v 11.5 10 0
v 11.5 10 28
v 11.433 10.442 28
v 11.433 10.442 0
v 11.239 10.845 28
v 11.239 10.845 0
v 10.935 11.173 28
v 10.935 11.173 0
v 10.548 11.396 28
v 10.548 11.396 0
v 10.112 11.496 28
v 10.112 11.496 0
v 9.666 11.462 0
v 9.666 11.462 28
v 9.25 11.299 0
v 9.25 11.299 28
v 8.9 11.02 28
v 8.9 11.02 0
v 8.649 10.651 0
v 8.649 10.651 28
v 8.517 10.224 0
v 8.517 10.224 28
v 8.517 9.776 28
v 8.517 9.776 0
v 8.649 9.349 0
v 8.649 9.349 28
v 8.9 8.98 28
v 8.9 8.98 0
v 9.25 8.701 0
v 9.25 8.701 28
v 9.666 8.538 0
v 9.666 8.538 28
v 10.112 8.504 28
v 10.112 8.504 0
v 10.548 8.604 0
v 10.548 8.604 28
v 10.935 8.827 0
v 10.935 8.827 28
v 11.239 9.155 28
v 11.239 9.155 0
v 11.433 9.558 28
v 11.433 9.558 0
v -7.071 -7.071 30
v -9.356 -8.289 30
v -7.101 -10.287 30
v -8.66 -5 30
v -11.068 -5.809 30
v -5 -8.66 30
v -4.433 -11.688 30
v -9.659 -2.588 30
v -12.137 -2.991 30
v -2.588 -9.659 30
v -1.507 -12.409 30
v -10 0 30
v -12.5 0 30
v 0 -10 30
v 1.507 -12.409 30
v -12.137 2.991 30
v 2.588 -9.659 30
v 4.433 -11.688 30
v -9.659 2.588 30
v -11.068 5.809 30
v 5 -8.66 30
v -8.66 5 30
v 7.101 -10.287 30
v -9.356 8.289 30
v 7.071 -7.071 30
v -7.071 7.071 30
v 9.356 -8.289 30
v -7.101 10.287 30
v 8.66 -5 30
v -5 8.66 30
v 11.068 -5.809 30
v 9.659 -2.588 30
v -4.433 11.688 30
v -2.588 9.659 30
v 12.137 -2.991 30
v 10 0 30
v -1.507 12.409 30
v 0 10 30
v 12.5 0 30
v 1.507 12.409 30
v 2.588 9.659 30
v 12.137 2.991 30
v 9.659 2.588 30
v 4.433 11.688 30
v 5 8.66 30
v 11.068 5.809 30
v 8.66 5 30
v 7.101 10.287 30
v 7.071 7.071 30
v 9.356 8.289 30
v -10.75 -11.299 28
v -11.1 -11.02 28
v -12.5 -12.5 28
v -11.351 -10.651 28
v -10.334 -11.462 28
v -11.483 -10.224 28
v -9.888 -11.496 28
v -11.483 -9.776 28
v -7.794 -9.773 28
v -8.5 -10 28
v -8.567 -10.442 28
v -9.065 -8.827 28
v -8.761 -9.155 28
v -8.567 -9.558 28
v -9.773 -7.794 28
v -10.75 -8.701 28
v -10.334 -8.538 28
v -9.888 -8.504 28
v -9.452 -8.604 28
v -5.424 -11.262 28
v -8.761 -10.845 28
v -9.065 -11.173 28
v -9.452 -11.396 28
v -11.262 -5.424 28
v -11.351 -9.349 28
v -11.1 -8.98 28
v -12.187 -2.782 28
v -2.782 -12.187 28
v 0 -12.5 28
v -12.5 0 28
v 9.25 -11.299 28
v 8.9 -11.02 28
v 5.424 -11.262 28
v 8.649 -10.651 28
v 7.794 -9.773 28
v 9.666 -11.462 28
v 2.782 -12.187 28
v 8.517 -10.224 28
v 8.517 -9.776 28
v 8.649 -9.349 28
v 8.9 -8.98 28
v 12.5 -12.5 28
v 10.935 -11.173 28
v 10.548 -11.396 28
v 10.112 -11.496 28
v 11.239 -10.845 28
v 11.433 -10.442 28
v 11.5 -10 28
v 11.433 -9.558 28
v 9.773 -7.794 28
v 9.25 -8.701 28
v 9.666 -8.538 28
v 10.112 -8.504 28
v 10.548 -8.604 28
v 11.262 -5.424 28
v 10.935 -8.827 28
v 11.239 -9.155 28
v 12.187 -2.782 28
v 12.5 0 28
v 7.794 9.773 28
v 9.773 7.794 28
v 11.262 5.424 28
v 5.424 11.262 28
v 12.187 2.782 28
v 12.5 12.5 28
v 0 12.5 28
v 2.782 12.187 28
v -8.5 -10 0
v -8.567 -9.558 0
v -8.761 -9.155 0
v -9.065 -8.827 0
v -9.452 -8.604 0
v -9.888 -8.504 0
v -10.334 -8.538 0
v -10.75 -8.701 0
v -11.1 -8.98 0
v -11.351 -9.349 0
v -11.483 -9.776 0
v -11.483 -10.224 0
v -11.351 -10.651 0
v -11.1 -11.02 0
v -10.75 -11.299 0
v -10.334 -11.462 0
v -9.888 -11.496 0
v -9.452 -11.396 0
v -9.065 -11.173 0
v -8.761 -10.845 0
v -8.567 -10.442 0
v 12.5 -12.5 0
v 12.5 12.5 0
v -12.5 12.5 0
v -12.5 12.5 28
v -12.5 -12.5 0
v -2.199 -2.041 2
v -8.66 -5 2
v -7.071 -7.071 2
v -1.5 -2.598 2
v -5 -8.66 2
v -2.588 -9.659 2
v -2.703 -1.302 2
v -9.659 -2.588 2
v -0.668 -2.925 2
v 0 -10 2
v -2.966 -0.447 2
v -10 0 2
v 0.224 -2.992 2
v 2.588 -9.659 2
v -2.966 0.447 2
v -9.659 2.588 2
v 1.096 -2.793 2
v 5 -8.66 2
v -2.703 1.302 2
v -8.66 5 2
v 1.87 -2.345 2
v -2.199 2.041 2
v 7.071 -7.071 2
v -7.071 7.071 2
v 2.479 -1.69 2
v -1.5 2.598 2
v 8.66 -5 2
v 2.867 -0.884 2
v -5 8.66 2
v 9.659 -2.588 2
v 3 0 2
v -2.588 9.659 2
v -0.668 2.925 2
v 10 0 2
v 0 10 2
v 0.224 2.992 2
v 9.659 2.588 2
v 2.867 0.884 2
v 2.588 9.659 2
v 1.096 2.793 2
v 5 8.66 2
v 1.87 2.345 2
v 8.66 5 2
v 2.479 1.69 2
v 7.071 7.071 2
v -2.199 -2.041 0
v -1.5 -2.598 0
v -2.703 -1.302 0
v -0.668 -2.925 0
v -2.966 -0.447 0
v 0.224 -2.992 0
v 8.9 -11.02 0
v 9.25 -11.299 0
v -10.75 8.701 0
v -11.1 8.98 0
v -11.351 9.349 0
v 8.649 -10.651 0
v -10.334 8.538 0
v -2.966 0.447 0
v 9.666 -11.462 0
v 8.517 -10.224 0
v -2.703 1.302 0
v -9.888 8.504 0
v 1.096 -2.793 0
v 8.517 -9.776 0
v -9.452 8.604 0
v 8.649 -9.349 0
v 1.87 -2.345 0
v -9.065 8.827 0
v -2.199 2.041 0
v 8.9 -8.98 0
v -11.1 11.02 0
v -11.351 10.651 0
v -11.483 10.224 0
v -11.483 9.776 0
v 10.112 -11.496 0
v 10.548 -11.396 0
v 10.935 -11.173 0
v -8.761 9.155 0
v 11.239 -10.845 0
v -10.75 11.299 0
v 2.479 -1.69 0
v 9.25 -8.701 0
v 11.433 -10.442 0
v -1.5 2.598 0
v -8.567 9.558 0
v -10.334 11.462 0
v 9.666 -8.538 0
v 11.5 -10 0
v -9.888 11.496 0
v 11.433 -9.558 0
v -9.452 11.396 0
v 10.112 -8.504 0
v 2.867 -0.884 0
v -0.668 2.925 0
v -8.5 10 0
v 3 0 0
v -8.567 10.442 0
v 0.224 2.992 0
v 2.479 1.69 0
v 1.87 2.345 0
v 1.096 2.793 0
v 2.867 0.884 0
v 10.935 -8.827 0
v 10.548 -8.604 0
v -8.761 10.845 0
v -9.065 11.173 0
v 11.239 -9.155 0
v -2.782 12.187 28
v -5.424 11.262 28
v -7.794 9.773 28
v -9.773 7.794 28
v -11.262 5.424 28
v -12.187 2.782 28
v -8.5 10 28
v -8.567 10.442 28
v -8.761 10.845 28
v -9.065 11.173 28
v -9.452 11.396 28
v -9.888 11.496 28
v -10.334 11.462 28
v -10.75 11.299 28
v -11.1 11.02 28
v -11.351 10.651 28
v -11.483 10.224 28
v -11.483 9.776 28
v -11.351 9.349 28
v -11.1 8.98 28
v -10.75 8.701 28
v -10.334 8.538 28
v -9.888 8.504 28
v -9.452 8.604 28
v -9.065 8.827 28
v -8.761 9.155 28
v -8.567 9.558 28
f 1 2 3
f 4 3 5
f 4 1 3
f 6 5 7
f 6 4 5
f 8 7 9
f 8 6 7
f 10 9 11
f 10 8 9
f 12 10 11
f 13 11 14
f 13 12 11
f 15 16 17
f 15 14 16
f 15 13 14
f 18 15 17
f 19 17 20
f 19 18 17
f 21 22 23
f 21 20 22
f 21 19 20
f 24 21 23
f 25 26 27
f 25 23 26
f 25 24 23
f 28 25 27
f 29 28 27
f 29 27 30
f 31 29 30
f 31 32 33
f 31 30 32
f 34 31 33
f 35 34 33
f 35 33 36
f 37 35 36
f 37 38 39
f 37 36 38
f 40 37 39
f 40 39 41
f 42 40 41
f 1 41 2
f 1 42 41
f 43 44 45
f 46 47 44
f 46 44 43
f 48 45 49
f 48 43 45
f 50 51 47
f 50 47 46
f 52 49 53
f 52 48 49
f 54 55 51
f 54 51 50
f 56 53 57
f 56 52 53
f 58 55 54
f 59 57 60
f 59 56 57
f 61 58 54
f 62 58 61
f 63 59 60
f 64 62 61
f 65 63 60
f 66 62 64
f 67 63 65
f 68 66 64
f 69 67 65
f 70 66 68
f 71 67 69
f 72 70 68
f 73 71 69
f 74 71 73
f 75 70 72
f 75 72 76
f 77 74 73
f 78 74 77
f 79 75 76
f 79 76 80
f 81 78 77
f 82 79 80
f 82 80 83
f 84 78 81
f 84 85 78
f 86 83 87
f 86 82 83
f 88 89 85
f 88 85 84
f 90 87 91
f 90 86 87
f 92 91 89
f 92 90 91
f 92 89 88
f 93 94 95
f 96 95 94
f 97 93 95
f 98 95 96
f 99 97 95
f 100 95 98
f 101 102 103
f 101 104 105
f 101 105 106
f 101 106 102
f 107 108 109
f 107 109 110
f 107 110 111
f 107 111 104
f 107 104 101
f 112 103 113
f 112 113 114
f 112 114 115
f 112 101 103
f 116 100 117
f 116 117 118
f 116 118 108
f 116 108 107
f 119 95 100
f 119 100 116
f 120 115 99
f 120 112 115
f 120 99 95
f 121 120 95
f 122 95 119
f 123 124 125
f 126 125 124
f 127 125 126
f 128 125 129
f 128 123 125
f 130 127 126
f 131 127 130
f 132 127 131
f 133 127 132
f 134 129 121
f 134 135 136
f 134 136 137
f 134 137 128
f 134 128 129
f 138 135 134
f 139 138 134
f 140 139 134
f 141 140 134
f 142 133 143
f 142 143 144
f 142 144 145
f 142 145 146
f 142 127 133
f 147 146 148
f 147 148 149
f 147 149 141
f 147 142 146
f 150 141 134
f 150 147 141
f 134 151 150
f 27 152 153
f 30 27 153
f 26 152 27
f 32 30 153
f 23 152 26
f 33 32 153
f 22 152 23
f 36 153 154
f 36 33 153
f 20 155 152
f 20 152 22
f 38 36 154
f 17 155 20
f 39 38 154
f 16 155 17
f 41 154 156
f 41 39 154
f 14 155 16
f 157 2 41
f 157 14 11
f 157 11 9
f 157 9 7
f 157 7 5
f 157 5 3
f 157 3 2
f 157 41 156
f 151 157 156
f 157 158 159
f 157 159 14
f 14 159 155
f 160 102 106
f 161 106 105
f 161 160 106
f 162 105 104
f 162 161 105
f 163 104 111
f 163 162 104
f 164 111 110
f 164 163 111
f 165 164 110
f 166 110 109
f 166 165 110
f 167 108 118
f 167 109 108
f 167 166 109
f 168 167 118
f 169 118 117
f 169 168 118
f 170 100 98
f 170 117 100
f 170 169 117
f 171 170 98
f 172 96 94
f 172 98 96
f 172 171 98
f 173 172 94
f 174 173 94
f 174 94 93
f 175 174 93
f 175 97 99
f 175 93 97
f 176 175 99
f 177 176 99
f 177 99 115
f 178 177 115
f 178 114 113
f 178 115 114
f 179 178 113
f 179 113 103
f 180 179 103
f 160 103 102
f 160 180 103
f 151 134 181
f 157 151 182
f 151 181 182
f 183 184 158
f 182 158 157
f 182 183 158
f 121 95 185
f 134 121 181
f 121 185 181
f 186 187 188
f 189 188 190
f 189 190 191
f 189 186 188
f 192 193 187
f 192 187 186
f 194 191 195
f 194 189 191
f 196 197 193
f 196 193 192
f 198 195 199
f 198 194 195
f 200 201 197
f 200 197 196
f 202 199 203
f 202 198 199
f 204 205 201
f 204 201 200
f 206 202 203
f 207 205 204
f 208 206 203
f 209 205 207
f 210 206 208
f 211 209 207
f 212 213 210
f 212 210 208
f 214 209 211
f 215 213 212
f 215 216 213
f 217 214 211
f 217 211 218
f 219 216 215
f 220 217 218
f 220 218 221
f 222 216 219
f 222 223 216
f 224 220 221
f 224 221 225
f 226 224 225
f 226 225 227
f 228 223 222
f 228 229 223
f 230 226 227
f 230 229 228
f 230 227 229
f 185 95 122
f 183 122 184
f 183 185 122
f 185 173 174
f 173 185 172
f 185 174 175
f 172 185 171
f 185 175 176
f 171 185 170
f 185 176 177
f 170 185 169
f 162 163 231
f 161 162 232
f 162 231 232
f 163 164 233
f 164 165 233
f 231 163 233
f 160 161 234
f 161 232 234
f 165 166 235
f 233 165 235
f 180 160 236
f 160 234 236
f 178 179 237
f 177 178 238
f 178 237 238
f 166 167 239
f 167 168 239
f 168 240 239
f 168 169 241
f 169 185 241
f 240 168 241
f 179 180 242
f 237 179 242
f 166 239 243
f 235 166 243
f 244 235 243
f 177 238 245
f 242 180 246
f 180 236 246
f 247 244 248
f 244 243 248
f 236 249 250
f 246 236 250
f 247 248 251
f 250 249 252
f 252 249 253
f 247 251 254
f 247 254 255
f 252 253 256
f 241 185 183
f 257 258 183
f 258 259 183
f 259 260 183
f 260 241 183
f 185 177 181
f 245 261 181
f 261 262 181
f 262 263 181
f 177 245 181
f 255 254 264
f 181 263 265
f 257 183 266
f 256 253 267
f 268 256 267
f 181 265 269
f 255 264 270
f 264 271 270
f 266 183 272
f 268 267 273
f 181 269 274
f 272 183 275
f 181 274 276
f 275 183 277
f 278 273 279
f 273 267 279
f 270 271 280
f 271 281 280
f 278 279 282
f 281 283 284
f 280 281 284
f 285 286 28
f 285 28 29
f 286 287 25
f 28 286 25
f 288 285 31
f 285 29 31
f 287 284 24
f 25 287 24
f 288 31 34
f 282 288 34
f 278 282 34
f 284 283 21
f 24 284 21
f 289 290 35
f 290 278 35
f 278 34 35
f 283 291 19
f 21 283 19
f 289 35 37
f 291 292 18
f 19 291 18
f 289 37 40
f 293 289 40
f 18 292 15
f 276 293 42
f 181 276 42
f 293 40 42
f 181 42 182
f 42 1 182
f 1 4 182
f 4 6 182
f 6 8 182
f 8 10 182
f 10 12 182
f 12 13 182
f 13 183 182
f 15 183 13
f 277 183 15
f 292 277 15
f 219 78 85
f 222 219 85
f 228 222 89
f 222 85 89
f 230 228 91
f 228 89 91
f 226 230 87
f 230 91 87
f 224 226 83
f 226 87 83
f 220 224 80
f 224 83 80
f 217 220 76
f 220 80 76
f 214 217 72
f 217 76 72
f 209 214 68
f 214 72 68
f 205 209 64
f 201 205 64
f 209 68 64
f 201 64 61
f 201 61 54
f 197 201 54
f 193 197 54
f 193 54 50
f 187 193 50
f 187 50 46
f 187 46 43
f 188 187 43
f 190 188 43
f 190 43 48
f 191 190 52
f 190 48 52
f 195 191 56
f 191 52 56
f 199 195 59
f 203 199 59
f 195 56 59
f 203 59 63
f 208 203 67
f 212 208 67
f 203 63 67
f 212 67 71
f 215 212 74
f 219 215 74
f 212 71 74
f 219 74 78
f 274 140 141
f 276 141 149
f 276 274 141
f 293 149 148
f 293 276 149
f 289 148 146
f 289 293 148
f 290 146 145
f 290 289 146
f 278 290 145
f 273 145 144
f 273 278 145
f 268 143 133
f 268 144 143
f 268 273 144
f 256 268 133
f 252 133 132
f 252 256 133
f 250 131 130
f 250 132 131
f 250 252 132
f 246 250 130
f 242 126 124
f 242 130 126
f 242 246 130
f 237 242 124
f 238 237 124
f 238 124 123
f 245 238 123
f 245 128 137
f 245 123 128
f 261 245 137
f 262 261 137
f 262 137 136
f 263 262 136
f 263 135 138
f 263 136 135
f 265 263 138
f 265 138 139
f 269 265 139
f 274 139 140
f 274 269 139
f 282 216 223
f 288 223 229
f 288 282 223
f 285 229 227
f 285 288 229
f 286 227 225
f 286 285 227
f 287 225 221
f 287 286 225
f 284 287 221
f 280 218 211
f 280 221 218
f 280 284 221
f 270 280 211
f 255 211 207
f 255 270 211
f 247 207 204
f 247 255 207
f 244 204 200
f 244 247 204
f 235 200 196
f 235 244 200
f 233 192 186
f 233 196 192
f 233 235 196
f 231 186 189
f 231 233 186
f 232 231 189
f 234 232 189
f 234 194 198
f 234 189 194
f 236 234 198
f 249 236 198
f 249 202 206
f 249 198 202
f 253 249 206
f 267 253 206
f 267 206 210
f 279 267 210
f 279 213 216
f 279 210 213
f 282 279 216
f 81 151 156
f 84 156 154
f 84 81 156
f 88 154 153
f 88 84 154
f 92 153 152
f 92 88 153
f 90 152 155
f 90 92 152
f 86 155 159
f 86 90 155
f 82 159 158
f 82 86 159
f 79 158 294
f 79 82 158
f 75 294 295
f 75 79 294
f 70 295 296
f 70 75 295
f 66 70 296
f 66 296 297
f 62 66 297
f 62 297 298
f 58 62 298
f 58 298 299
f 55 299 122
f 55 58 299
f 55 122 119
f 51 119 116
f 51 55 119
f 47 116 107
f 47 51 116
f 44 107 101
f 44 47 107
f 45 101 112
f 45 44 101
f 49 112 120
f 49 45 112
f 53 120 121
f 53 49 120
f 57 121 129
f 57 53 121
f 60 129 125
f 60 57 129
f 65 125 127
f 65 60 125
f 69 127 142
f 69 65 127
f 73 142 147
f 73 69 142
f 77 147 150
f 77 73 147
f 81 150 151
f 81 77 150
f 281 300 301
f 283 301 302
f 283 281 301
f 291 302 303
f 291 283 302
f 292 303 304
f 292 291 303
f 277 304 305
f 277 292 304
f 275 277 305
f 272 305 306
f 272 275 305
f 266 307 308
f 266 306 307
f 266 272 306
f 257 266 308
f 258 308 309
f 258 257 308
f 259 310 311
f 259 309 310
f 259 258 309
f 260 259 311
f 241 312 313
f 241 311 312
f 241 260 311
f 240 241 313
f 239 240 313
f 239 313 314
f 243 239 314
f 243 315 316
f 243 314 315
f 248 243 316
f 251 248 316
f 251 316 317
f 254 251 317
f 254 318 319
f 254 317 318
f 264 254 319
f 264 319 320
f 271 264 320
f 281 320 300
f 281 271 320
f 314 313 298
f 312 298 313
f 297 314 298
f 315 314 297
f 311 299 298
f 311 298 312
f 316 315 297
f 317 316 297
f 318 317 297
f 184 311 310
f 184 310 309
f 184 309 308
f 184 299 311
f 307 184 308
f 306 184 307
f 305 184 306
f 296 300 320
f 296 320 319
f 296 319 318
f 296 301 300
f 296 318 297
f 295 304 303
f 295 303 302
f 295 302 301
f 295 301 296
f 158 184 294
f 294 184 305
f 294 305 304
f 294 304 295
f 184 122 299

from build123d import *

# Parameters (mm, degrees)
ESQUISSE1_W      = 25
ESQUISSE1_H      = 25
ESQUISSE1_R      = 1.5
ESQUISSE1_R_2    = 3
EXTRUSION3_DEPTH = 30
ESQUISSE8_R      = 10
EXTRUSION4_DEPTH = 28
ESQUISSE10_R     = 18.049415766
ESQUISSE10_R_2   = 12.5
EXTRUSION6_DEPTH = 2


with BuildPart() as part:
    # Esquisse1 → Extrusion3 (new body)
    with BuildSketch(Plane.XY):
        Rectangle(ESQUISSE1_W, ESQUISSE1_H)
        with Locations((10, 10)):
            Circle(ESQUISSE1_R, mode=Mode.SUBTRACT)
        Circle(ESQUISSE1_R_2, mode=Mode.SUBTRACT)
        with Locations((-10, 10)):
            Circle(ESQUISSE1_R, mode=Mode.SUBTRACT)
        with Locations((10, -10)):
            Circle(ESQUISSE1_R, mode=Mode.SUBTRACT)
        with Locations((-10, -10)):
            Circle(ESQUISSE1_R, mode=Mode.SUBTRACT)
    extrude(amount=EXTRUSION3_DEPTH)

    # Esquisse8 → Extrusion4 (cut)
    with BuildSketch(Plane.XY.offset(30)):
        Circle(ESQUISSE8_R)
    extrude(amount=-EXTRUSION4_DEPTH, mode=Mode.SUBTRACT)

    # Esquisse10 → Extrusion6 (cut)
    with BuildSketch(Plane.XY.offset(30)):
        Circle(ESQUISSE10_R)
        Circle(ESQUISSE10_R_2, mode=Mode.SUBTRACT)
    extrude(amount=-EXTRUSION6_DEPTH, mode=Mode.SUBTRACT)


solid = part.part
